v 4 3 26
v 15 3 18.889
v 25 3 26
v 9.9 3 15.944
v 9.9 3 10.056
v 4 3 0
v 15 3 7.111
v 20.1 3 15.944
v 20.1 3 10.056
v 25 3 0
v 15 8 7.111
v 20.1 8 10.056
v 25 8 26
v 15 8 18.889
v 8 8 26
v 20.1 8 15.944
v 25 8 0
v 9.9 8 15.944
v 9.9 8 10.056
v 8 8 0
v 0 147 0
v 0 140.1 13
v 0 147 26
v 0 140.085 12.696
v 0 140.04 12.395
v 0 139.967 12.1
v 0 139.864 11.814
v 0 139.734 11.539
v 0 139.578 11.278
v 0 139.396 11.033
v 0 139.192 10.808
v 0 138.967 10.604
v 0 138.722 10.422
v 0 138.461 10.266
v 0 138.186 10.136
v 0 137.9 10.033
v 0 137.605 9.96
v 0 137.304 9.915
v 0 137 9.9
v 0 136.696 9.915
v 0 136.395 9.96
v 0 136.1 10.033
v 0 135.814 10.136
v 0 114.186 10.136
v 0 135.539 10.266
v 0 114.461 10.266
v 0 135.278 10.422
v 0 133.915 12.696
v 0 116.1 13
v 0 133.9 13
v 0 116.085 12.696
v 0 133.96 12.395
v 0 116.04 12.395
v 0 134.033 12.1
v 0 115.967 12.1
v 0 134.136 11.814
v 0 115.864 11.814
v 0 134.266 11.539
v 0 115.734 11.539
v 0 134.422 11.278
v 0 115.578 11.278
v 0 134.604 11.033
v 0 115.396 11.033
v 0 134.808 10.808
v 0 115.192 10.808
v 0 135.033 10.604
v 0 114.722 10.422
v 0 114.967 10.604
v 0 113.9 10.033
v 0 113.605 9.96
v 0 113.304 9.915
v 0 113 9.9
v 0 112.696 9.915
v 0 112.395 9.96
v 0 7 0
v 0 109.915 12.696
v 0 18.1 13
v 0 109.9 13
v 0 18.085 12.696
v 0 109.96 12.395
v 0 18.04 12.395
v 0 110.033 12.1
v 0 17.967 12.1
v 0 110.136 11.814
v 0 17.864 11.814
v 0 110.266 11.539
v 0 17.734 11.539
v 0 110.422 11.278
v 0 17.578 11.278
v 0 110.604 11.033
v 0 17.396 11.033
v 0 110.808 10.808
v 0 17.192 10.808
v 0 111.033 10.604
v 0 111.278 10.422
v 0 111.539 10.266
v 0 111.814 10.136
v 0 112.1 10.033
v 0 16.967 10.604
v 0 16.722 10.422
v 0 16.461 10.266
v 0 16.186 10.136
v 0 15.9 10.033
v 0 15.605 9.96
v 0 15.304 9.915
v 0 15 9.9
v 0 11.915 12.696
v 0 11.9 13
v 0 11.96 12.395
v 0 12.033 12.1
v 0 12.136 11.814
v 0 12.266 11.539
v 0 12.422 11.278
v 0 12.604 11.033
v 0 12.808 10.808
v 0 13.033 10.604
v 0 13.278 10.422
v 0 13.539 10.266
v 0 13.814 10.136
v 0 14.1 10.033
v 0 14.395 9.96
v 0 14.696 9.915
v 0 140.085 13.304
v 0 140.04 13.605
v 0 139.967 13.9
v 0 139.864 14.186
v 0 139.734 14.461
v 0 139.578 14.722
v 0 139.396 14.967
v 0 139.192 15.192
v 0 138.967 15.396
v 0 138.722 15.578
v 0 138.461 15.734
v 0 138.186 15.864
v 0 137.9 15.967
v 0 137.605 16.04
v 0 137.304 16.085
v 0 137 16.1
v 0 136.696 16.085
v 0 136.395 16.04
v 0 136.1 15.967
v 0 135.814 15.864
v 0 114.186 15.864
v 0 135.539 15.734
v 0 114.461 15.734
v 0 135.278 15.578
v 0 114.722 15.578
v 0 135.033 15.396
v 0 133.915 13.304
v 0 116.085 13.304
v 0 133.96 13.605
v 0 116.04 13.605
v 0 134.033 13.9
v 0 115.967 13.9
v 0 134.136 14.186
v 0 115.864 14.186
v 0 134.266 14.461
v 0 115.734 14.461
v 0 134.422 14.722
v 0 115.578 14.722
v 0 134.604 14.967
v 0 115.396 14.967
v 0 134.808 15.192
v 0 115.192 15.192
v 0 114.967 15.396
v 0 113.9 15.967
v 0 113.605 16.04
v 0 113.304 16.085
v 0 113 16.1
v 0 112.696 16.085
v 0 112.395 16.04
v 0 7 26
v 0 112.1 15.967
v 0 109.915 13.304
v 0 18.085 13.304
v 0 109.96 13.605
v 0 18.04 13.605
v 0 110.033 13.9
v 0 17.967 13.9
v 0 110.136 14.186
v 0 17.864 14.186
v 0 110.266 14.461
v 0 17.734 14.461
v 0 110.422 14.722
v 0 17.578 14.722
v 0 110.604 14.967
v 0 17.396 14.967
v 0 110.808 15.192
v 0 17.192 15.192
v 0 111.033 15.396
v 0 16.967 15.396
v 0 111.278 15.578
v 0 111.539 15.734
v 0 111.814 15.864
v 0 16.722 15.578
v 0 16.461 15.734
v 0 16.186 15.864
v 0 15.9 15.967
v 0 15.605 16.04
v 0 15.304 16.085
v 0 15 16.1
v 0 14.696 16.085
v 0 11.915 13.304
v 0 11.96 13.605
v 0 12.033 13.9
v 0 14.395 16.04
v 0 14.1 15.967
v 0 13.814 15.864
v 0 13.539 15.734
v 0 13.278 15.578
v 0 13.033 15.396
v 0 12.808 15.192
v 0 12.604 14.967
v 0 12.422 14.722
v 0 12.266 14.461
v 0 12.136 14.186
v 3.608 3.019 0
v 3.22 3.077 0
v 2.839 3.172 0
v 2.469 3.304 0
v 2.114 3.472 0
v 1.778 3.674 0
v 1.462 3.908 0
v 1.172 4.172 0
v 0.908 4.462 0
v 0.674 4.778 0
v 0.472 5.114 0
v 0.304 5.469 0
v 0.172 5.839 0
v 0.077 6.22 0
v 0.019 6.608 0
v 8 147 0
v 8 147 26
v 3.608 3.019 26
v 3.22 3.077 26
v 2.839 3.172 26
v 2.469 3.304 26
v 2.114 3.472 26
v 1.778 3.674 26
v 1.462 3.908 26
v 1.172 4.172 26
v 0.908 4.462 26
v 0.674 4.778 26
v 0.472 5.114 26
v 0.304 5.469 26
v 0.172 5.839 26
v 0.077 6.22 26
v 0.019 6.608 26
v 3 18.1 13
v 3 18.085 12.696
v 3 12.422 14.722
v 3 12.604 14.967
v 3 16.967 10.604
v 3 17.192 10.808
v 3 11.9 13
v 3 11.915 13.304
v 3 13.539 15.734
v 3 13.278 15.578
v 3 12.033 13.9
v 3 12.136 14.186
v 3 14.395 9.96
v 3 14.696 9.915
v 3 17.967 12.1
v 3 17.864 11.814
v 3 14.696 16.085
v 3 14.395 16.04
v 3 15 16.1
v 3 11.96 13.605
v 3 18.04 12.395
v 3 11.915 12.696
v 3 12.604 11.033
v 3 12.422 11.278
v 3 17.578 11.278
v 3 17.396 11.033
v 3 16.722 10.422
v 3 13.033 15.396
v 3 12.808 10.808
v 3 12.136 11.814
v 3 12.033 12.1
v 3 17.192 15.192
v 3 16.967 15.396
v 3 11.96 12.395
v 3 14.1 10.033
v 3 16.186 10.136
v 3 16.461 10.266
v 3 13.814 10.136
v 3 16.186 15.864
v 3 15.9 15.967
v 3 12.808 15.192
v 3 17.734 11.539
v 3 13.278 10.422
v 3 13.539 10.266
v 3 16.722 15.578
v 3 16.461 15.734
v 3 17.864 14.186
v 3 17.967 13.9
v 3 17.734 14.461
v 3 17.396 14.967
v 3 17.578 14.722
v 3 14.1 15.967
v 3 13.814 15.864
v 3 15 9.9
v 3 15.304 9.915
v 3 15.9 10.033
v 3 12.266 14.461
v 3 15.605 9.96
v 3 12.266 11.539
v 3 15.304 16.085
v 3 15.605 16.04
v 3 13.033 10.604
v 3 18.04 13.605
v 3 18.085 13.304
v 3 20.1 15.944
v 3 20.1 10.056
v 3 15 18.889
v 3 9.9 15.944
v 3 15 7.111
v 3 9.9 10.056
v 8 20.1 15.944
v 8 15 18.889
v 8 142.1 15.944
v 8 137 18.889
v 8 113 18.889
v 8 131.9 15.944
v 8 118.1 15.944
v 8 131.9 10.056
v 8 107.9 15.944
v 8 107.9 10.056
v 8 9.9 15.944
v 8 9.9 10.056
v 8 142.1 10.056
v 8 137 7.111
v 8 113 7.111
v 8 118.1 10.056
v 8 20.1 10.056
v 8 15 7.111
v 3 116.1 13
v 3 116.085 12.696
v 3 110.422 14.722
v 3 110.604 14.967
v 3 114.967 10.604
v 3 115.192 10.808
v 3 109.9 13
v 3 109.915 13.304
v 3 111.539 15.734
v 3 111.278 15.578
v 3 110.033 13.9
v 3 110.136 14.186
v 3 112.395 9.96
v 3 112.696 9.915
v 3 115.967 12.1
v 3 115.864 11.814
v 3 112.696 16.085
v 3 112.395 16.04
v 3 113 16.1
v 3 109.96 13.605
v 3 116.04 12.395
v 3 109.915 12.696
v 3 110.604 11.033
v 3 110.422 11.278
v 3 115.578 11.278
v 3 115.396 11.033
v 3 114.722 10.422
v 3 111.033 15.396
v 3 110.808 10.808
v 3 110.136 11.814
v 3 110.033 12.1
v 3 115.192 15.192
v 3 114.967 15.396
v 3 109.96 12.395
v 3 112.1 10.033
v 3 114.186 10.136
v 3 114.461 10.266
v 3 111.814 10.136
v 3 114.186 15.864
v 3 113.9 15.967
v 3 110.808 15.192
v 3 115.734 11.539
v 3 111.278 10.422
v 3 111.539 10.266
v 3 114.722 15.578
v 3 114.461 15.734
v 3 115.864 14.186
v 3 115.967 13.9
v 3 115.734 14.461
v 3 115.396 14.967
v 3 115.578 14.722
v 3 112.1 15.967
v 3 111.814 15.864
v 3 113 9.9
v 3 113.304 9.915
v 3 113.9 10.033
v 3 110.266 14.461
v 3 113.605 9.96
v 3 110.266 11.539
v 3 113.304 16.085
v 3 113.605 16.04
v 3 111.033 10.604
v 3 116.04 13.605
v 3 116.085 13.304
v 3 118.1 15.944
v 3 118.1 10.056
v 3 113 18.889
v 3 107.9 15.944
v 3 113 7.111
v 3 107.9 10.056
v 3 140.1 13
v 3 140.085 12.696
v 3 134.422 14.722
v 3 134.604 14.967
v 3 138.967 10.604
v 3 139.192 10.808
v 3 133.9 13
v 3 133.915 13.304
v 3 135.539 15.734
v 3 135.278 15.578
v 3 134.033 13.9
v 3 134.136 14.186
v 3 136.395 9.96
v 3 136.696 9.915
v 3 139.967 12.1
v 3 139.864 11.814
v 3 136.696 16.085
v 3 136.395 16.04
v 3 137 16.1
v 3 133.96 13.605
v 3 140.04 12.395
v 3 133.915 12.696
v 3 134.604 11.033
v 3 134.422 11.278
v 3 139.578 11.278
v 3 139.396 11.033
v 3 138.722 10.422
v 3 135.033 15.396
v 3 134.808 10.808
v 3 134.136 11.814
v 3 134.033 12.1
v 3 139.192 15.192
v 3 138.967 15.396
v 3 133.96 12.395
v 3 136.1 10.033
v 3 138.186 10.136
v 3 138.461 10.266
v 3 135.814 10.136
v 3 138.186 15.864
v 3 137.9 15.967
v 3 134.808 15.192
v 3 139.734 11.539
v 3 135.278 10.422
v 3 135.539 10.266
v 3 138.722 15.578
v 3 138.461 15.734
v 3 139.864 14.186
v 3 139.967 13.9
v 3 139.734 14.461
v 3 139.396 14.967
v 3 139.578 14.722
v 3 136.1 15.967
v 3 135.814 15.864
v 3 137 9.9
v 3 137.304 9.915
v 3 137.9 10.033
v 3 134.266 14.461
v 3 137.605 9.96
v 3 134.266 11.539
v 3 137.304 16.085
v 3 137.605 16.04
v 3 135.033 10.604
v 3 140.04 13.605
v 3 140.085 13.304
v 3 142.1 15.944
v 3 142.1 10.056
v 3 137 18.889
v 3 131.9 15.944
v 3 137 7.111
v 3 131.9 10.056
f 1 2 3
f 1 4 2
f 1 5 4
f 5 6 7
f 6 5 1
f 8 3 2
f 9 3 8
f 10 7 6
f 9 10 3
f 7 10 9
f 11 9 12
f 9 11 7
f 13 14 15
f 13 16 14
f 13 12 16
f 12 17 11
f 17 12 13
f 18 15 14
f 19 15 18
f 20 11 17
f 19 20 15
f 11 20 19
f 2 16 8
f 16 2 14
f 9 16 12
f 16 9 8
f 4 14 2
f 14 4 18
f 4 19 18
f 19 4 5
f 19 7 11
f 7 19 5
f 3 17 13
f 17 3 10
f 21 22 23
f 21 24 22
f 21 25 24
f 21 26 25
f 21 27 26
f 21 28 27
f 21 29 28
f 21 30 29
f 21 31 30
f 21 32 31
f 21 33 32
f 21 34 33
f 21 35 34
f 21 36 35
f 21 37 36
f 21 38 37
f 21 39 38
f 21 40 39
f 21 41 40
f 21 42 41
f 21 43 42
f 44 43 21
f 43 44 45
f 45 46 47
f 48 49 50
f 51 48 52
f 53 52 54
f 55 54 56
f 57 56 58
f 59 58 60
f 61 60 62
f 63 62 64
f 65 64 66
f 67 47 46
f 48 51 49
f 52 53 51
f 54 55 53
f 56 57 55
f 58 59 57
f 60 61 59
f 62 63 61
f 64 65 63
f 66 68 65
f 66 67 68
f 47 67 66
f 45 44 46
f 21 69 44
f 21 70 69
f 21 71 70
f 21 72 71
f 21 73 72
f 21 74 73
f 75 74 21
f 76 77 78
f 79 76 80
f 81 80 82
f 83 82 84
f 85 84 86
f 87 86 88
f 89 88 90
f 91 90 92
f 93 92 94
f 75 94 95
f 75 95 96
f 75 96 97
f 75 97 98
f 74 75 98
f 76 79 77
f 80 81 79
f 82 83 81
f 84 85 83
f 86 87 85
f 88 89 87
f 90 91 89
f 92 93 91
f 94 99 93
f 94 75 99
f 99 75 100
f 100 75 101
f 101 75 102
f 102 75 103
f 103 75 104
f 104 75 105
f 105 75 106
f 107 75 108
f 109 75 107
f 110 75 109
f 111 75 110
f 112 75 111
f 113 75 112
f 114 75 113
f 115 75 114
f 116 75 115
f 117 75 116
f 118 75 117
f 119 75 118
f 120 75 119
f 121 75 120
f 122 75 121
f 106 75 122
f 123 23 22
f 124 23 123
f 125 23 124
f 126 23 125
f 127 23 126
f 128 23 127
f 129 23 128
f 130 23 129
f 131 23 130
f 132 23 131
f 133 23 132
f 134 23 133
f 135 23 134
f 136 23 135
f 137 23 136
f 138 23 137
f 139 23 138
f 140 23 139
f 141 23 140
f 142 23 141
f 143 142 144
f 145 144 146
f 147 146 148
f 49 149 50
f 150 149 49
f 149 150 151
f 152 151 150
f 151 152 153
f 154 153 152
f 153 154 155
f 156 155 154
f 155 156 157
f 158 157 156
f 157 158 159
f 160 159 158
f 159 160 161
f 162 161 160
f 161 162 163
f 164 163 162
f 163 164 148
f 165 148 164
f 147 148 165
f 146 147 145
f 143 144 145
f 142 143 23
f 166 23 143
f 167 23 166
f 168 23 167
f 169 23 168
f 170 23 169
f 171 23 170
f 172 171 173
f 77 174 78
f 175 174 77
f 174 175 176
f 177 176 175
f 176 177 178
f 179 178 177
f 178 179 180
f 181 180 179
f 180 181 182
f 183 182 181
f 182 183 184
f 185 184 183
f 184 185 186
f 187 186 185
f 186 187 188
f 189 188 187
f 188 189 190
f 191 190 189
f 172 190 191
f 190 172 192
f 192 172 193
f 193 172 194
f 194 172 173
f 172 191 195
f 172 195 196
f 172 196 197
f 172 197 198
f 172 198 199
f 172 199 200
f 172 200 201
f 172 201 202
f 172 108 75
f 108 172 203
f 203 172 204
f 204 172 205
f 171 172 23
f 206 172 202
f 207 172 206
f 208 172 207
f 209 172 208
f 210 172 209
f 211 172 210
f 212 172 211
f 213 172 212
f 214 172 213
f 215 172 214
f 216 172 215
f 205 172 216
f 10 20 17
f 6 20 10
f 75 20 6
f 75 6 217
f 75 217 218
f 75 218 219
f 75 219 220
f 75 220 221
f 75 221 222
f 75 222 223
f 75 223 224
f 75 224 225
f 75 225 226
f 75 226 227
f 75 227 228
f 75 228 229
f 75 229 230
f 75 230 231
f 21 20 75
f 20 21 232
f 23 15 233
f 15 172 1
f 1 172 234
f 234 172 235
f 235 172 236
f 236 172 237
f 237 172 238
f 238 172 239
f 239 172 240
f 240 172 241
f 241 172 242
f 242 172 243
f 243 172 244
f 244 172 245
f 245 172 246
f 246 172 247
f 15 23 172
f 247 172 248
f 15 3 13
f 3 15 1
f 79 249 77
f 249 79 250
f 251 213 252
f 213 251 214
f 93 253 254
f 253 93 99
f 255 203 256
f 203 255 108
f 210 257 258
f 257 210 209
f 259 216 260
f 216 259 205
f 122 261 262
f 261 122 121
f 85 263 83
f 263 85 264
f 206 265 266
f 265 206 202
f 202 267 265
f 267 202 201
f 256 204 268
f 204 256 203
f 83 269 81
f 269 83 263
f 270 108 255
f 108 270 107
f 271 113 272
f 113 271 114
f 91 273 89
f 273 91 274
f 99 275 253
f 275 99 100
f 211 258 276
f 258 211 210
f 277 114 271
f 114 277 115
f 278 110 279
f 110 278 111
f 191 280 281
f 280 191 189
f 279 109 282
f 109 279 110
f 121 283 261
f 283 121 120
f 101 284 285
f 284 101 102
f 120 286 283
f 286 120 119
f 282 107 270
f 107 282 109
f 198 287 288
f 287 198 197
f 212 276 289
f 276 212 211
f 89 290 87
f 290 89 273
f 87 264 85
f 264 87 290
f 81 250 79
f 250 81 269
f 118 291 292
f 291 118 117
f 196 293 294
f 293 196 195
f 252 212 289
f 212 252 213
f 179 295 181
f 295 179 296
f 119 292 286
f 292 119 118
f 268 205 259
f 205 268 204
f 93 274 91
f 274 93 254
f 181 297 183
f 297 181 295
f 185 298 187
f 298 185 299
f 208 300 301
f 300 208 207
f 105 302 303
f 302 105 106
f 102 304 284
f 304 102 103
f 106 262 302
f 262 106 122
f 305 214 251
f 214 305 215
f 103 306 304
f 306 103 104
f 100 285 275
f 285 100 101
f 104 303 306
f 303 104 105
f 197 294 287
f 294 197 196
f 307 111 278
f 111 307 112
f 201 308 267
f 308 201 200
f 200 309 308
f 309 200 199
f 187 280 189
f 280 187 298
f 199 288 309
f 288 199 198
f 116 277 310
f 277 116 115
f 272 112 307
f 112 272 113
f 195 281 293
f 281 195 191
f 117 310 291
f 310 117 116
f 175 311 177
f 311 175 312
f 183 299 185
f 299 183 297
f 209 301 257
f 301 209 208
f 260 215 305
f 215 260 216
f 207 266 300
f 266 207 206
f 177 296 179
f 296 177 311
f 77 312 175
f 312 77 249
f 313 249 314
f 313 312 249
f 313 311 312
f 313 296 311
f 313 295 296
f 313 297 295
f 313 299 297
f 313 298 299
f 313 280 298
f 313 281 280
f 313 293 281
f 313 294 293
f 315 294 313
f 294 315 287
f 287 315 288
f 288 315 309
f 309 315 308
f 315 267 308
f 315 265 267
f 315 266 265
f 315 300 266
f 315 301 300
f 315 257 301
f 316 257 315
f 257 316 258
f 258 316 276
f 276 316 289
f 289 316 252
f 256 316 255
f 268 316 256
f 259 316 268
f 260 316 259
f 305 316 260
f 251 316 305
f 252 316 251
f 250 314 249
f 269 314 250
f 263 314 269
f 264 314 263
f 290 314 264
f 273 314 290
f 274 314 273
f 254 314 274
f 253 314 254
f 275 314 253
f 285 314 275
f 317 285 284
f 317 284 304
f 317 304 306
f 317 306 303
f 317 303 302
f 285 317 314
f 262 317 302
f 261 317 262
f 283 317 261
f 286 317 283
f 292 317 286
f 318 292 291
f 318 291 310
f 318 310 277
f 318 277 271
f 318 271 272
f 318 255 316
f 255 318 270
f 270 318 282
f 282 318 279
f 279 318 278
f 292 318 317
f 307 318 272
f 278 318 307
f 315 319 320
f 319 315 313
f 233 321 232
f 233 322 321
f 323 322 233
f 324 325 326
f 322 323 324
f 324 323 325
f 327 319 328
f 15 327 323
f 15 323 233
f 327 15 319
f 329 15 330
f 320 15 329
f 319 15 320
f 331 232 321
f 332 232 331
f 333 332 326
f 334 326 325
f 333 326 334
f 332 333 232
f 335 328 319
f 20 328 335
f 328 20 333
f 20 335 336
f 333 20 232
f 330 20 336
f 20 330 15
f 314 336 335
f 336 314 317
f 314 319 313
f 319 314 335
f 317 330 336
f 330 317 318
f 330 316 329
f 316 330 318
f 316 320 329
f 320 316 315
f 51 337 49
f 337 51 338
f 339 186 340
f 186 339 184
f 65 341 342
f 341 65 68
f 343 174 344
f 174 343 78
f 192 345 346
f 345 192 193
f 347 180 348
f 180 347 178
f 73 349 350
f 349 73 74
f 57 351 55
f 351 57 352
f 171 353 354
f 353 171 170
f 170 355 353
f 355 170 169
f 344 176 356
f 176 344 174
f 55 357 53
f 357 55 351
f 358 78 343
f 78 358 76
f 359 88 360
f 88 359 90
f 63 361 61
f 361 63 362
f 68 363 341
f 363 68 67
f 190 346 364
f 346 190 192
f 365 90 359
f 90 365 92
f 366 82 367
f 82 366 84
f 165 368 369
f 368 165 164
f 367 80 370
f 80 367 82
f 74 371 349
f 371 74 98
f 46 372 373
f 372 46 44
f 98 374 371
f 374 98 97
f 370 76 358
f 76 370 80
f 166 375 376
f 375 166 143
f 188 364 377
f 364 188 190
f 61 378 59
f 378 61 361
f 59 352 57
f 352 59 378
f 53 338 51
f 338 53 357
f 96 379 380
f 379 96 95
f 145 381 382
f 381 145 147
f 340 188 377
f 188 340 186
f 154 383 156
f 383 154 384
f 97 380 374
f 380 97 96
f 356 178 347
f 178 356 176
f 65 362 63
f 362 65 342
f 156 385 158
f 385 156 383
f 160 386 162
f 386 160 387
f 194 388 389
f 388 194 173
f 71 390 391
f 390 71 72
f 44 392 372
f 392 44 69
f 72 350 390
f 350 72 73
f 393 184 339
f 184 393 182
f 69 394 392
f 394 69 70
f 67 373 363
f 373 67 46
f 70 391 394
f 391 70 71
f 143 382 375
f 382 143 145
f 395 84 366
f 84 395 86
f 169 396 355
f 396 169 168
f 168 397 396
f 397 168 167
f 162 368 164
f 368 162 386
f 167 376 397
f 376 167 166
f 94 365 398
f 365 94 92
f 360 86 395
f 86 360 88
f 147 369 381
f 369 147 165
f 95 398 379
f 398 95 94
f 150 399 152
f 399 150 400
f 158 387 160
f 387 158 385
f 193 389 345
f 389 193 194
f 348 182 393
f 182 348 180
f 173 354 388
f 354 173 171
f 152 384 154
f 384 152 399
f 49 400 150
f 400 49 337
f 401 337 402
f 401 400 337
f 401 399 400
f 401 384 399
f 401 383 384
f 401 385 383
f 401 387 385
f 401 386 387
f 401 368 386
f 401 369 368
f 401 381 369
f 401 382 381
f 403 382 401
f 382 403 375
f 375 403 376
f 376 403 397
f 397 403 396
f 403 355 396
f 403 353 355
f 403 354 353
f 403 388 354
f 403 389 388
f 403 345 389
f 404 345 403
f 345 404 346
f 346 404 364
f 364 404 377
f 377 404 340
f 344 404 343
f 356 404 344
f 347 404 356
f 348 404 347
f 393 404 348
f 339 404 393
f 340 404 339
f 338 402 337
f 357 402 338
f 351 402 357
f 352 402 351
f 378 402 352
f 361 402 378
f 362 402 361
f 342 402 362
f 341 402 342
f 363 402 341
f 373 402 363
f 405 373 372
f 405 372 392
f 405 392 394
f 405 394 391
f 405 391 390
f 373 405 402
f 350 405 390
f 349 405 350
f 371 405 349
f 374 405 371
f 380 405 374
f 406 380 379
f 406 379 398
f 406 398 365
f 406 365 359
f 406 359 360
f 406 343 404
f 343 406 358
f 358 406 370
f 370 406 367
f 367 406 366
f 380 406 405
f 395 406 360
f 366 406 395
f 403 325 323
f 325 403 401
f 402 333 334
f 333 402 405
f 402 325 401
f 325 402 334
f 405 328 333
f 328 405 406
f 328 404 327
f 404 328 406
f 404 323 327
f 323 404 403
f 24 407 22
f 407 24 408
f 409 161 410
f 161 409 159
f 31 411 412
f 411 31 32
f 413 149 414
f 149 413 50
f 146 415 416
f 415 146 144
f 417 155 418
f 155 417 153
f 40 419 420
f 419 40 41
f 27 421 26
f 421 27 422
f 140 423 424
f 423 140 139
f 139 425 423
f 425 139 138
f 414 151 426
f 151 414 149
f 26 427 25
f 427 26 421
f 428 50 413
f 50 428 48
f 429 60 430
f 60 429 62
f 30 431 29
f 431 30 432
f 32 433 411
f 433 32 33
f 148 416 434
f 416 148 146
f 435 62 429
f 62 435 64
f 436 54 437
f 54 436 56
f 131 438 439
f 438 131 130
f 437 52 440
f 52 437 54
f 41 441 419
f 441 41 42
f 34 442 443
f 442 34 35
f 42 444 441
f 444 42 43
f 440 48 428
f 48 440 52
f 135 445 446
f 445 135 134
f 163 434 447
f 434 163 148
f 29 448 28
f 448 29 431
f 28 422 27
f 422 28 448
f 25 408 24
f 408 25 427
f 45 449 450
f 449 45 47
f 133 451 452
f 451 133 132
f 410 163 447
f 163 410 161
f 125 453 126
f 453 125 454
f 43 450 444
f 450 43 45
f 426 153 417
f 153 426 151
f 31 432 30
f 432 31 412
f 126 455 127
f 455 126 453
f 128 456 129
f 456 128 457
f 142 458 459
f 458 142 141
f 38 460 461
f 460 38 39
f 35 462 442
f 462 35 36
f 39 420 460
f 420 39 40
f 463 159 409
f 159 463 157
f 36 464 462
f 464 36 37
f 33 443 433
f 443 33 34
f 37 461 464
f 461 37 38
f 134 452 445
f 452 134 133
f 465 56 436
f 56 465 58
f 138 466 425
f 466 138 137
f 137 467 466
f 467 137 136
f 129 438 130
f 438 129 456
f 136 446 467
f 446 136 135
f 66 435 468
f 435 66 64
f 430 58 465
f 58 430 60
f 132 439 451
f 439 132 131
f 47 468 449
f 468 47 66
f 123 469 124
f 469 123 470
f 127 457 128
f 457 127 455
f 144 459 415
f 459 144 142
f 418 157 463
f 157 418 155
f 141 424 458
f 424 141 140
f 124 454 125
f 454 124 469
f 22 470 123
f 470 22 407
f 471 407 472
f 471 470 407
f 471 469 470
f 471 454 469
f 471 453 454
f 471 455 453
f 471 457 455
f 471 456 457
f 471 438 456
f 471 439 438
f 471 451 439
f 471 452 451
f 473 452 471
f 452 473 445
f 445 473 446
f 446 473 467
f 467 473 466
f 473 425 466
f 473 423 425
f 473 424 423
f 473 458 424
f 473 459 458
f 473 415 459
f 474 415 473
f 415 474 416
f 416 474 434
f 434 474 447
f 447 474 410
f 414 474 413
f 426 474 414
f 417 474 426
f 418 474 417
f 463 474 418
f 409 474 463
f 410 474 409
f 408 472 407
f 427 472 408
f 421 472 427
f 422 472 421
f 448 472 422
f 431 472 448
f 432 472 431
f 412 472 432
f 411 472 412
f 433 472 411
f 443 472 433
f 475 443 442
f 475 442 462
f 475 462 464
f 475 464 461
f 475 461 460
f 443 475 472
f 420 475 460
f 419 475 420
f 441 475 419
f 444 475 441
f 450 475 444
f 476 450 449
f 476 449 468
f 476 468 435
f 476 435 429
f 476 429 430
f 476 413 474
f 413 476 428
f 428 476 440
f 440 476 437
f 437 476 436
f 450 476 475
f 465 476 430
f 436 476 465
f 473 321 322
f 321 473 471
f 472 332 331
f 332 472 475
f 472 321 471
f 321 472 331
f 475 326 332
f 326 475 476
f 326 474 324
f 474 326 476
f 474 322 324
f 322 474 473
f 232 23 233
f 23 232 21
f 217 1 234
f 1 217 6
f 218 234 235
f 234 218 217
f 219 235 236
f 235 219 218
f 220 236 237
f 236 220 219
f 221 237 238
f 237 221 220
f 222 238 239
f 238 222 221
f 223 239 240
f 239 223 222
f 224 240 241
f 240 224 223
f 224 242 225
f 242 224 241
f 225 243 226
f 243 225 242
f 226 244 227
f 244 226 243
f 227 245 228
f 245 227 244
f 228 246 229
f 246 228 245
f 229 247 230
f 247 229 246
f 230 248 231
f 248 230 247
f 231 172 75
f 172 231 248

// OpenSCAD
// file: ../../../modules/bolts.scad
module nut_trap(d, h) {
  linear_extrude(height = h, center = true)
  circle(d = d / cos(30), $fn = 6);
}

module bolt_hole(d, h) {
  linear_extrude(height = h, center = true)
  circle(d = d, $fn = 64);
}

module m3_bolt_hole_with_nut (x, y, h) {
  nut_thickness = 2.4;

  union() {
    translate([0, 0, h / 2])
    bolt_hole(d = 3.4, h = h + 1);
    
    // cylinder center is at h/2, so we need to move it up.
    // We want the nut to be from (h - nut_thickness) to h.
    // The center of the nut will be at h - (nut_thickness / 2).
    translate([0, 0, h - nut_thickness / 2])
    rotate([0, 0, 90])
    nut_trap(d = 5.7, h = nut_thickness);
  }
}

module m4_bolt_hole_with_nut (h) {
  nut_thickness = 3.2;

  union() {
    translate([0, 0, h / 2])
    bolt_hole(d = 4.4, h = h + 1);
    
    translate([0, 0, h - nut_thickness / 2])
    rotate([0, 0, 90])
    nut_trap(d = 7.2, h = nut_thickness);
  }
}

module m6_bolt_hole_with_nut (h) {
  nut_thickness = 5;

  union() {
    translate([0, 0, h / 2])
    bolt_hole(d = 6.2, h = h + 1);
    
    translate([0, 0, h - nut_thickness / 2])
    rotate([0, 0, 90])
    nut_trap(d = 10.2, h = nut_thickness);
  }
}

module m8_bolt_hole_with_nut (h) {
  nut_thickness = 6.5;

  union() {
    translate([0, 0, h / 2])
    bolt_hole(d = 8.4, h = h + 1);
    
    translate([0, 0, h - nut_thickness / 2])
    rotate([0, 0, 90])
    nut_trap(d = 13.3, h = nut_thickness);
  }
}

// Hex holes for self-tapping (nominal - 0.2mm)
module hex_hole(flat_d, h) {
  linear_extrude(height = h, center = true)
  circle(d = flat_d / cos(30), $fn = 6);
}

module m3_bolt_hexhole(h) {
  rotate([0, 0, 90])
  hex_hole(flat_d = 2.8, h = h);
}

module m4_bolt_hexhole(h) {
  rotate([0, 0, 90])
  hex_hole(flat_d = 3.8, h = h);
}

module m6_bolt_hexhole(h) {
  rotate([0, 0, 90])
  hex_hole(flat_d = 5.8, h = h);
}

module m8_bolt_hexhole(h) {
  rotate([0, 0, 90])
  hex_hole(flat_d = 7.8, h = h);
}
// main file
use <../../../modules/bolts.scad>;
width = 147;
height = 26;
deps = 8;
radius = 4;

difference() {
  union(){
    translate([0, 0, height])
    rotate([90, 180, 180])
    short_bar(25, height, deps);
    
    translate([0, 0, 0])
    rotate([90, 0, 90])
    long_bar(width, height, deps);
  }

  translate([deps / 2, deps / 2 + 3, 0])
  rotate([0, 0, 180])
  fillet_profile(radius, height * 2 + 1);
  
  translate([deps / 2, 0, 0])
  cube([50, 6, height * 2 + 1], center = true);
}

module fillet_profile(r, h) {
  linear_extrude(height = h, center = true)
  difference() {
    square([r, r]);
    circle(r = r, $fn = 64);
  }
}

module short_bar (w, y, h) {
  difference() {
    translate([w / 2, y / 2, h / 2])
    cube([w, y, h], center=true);

    translate([15, y / 2, 0])
    m6_bolt_hole_with_nut(h);
  }
}

module long_bar (w, y, h) {
  difference() {
    translate([w / 2, y / 2, h / 2])
    cube([w, y, h], center=true);

    translate([15, y / 2, 0])
    m6_bolt_hole_with_nut(h);
    translate([15 + 98, y / 2, 0])
    m6_bolt_hole_with_nut(h);
    translate([15 + 98 + 24, y / 2, 0])
    m6_bolt_hole_with_nut(h);
  }
}
